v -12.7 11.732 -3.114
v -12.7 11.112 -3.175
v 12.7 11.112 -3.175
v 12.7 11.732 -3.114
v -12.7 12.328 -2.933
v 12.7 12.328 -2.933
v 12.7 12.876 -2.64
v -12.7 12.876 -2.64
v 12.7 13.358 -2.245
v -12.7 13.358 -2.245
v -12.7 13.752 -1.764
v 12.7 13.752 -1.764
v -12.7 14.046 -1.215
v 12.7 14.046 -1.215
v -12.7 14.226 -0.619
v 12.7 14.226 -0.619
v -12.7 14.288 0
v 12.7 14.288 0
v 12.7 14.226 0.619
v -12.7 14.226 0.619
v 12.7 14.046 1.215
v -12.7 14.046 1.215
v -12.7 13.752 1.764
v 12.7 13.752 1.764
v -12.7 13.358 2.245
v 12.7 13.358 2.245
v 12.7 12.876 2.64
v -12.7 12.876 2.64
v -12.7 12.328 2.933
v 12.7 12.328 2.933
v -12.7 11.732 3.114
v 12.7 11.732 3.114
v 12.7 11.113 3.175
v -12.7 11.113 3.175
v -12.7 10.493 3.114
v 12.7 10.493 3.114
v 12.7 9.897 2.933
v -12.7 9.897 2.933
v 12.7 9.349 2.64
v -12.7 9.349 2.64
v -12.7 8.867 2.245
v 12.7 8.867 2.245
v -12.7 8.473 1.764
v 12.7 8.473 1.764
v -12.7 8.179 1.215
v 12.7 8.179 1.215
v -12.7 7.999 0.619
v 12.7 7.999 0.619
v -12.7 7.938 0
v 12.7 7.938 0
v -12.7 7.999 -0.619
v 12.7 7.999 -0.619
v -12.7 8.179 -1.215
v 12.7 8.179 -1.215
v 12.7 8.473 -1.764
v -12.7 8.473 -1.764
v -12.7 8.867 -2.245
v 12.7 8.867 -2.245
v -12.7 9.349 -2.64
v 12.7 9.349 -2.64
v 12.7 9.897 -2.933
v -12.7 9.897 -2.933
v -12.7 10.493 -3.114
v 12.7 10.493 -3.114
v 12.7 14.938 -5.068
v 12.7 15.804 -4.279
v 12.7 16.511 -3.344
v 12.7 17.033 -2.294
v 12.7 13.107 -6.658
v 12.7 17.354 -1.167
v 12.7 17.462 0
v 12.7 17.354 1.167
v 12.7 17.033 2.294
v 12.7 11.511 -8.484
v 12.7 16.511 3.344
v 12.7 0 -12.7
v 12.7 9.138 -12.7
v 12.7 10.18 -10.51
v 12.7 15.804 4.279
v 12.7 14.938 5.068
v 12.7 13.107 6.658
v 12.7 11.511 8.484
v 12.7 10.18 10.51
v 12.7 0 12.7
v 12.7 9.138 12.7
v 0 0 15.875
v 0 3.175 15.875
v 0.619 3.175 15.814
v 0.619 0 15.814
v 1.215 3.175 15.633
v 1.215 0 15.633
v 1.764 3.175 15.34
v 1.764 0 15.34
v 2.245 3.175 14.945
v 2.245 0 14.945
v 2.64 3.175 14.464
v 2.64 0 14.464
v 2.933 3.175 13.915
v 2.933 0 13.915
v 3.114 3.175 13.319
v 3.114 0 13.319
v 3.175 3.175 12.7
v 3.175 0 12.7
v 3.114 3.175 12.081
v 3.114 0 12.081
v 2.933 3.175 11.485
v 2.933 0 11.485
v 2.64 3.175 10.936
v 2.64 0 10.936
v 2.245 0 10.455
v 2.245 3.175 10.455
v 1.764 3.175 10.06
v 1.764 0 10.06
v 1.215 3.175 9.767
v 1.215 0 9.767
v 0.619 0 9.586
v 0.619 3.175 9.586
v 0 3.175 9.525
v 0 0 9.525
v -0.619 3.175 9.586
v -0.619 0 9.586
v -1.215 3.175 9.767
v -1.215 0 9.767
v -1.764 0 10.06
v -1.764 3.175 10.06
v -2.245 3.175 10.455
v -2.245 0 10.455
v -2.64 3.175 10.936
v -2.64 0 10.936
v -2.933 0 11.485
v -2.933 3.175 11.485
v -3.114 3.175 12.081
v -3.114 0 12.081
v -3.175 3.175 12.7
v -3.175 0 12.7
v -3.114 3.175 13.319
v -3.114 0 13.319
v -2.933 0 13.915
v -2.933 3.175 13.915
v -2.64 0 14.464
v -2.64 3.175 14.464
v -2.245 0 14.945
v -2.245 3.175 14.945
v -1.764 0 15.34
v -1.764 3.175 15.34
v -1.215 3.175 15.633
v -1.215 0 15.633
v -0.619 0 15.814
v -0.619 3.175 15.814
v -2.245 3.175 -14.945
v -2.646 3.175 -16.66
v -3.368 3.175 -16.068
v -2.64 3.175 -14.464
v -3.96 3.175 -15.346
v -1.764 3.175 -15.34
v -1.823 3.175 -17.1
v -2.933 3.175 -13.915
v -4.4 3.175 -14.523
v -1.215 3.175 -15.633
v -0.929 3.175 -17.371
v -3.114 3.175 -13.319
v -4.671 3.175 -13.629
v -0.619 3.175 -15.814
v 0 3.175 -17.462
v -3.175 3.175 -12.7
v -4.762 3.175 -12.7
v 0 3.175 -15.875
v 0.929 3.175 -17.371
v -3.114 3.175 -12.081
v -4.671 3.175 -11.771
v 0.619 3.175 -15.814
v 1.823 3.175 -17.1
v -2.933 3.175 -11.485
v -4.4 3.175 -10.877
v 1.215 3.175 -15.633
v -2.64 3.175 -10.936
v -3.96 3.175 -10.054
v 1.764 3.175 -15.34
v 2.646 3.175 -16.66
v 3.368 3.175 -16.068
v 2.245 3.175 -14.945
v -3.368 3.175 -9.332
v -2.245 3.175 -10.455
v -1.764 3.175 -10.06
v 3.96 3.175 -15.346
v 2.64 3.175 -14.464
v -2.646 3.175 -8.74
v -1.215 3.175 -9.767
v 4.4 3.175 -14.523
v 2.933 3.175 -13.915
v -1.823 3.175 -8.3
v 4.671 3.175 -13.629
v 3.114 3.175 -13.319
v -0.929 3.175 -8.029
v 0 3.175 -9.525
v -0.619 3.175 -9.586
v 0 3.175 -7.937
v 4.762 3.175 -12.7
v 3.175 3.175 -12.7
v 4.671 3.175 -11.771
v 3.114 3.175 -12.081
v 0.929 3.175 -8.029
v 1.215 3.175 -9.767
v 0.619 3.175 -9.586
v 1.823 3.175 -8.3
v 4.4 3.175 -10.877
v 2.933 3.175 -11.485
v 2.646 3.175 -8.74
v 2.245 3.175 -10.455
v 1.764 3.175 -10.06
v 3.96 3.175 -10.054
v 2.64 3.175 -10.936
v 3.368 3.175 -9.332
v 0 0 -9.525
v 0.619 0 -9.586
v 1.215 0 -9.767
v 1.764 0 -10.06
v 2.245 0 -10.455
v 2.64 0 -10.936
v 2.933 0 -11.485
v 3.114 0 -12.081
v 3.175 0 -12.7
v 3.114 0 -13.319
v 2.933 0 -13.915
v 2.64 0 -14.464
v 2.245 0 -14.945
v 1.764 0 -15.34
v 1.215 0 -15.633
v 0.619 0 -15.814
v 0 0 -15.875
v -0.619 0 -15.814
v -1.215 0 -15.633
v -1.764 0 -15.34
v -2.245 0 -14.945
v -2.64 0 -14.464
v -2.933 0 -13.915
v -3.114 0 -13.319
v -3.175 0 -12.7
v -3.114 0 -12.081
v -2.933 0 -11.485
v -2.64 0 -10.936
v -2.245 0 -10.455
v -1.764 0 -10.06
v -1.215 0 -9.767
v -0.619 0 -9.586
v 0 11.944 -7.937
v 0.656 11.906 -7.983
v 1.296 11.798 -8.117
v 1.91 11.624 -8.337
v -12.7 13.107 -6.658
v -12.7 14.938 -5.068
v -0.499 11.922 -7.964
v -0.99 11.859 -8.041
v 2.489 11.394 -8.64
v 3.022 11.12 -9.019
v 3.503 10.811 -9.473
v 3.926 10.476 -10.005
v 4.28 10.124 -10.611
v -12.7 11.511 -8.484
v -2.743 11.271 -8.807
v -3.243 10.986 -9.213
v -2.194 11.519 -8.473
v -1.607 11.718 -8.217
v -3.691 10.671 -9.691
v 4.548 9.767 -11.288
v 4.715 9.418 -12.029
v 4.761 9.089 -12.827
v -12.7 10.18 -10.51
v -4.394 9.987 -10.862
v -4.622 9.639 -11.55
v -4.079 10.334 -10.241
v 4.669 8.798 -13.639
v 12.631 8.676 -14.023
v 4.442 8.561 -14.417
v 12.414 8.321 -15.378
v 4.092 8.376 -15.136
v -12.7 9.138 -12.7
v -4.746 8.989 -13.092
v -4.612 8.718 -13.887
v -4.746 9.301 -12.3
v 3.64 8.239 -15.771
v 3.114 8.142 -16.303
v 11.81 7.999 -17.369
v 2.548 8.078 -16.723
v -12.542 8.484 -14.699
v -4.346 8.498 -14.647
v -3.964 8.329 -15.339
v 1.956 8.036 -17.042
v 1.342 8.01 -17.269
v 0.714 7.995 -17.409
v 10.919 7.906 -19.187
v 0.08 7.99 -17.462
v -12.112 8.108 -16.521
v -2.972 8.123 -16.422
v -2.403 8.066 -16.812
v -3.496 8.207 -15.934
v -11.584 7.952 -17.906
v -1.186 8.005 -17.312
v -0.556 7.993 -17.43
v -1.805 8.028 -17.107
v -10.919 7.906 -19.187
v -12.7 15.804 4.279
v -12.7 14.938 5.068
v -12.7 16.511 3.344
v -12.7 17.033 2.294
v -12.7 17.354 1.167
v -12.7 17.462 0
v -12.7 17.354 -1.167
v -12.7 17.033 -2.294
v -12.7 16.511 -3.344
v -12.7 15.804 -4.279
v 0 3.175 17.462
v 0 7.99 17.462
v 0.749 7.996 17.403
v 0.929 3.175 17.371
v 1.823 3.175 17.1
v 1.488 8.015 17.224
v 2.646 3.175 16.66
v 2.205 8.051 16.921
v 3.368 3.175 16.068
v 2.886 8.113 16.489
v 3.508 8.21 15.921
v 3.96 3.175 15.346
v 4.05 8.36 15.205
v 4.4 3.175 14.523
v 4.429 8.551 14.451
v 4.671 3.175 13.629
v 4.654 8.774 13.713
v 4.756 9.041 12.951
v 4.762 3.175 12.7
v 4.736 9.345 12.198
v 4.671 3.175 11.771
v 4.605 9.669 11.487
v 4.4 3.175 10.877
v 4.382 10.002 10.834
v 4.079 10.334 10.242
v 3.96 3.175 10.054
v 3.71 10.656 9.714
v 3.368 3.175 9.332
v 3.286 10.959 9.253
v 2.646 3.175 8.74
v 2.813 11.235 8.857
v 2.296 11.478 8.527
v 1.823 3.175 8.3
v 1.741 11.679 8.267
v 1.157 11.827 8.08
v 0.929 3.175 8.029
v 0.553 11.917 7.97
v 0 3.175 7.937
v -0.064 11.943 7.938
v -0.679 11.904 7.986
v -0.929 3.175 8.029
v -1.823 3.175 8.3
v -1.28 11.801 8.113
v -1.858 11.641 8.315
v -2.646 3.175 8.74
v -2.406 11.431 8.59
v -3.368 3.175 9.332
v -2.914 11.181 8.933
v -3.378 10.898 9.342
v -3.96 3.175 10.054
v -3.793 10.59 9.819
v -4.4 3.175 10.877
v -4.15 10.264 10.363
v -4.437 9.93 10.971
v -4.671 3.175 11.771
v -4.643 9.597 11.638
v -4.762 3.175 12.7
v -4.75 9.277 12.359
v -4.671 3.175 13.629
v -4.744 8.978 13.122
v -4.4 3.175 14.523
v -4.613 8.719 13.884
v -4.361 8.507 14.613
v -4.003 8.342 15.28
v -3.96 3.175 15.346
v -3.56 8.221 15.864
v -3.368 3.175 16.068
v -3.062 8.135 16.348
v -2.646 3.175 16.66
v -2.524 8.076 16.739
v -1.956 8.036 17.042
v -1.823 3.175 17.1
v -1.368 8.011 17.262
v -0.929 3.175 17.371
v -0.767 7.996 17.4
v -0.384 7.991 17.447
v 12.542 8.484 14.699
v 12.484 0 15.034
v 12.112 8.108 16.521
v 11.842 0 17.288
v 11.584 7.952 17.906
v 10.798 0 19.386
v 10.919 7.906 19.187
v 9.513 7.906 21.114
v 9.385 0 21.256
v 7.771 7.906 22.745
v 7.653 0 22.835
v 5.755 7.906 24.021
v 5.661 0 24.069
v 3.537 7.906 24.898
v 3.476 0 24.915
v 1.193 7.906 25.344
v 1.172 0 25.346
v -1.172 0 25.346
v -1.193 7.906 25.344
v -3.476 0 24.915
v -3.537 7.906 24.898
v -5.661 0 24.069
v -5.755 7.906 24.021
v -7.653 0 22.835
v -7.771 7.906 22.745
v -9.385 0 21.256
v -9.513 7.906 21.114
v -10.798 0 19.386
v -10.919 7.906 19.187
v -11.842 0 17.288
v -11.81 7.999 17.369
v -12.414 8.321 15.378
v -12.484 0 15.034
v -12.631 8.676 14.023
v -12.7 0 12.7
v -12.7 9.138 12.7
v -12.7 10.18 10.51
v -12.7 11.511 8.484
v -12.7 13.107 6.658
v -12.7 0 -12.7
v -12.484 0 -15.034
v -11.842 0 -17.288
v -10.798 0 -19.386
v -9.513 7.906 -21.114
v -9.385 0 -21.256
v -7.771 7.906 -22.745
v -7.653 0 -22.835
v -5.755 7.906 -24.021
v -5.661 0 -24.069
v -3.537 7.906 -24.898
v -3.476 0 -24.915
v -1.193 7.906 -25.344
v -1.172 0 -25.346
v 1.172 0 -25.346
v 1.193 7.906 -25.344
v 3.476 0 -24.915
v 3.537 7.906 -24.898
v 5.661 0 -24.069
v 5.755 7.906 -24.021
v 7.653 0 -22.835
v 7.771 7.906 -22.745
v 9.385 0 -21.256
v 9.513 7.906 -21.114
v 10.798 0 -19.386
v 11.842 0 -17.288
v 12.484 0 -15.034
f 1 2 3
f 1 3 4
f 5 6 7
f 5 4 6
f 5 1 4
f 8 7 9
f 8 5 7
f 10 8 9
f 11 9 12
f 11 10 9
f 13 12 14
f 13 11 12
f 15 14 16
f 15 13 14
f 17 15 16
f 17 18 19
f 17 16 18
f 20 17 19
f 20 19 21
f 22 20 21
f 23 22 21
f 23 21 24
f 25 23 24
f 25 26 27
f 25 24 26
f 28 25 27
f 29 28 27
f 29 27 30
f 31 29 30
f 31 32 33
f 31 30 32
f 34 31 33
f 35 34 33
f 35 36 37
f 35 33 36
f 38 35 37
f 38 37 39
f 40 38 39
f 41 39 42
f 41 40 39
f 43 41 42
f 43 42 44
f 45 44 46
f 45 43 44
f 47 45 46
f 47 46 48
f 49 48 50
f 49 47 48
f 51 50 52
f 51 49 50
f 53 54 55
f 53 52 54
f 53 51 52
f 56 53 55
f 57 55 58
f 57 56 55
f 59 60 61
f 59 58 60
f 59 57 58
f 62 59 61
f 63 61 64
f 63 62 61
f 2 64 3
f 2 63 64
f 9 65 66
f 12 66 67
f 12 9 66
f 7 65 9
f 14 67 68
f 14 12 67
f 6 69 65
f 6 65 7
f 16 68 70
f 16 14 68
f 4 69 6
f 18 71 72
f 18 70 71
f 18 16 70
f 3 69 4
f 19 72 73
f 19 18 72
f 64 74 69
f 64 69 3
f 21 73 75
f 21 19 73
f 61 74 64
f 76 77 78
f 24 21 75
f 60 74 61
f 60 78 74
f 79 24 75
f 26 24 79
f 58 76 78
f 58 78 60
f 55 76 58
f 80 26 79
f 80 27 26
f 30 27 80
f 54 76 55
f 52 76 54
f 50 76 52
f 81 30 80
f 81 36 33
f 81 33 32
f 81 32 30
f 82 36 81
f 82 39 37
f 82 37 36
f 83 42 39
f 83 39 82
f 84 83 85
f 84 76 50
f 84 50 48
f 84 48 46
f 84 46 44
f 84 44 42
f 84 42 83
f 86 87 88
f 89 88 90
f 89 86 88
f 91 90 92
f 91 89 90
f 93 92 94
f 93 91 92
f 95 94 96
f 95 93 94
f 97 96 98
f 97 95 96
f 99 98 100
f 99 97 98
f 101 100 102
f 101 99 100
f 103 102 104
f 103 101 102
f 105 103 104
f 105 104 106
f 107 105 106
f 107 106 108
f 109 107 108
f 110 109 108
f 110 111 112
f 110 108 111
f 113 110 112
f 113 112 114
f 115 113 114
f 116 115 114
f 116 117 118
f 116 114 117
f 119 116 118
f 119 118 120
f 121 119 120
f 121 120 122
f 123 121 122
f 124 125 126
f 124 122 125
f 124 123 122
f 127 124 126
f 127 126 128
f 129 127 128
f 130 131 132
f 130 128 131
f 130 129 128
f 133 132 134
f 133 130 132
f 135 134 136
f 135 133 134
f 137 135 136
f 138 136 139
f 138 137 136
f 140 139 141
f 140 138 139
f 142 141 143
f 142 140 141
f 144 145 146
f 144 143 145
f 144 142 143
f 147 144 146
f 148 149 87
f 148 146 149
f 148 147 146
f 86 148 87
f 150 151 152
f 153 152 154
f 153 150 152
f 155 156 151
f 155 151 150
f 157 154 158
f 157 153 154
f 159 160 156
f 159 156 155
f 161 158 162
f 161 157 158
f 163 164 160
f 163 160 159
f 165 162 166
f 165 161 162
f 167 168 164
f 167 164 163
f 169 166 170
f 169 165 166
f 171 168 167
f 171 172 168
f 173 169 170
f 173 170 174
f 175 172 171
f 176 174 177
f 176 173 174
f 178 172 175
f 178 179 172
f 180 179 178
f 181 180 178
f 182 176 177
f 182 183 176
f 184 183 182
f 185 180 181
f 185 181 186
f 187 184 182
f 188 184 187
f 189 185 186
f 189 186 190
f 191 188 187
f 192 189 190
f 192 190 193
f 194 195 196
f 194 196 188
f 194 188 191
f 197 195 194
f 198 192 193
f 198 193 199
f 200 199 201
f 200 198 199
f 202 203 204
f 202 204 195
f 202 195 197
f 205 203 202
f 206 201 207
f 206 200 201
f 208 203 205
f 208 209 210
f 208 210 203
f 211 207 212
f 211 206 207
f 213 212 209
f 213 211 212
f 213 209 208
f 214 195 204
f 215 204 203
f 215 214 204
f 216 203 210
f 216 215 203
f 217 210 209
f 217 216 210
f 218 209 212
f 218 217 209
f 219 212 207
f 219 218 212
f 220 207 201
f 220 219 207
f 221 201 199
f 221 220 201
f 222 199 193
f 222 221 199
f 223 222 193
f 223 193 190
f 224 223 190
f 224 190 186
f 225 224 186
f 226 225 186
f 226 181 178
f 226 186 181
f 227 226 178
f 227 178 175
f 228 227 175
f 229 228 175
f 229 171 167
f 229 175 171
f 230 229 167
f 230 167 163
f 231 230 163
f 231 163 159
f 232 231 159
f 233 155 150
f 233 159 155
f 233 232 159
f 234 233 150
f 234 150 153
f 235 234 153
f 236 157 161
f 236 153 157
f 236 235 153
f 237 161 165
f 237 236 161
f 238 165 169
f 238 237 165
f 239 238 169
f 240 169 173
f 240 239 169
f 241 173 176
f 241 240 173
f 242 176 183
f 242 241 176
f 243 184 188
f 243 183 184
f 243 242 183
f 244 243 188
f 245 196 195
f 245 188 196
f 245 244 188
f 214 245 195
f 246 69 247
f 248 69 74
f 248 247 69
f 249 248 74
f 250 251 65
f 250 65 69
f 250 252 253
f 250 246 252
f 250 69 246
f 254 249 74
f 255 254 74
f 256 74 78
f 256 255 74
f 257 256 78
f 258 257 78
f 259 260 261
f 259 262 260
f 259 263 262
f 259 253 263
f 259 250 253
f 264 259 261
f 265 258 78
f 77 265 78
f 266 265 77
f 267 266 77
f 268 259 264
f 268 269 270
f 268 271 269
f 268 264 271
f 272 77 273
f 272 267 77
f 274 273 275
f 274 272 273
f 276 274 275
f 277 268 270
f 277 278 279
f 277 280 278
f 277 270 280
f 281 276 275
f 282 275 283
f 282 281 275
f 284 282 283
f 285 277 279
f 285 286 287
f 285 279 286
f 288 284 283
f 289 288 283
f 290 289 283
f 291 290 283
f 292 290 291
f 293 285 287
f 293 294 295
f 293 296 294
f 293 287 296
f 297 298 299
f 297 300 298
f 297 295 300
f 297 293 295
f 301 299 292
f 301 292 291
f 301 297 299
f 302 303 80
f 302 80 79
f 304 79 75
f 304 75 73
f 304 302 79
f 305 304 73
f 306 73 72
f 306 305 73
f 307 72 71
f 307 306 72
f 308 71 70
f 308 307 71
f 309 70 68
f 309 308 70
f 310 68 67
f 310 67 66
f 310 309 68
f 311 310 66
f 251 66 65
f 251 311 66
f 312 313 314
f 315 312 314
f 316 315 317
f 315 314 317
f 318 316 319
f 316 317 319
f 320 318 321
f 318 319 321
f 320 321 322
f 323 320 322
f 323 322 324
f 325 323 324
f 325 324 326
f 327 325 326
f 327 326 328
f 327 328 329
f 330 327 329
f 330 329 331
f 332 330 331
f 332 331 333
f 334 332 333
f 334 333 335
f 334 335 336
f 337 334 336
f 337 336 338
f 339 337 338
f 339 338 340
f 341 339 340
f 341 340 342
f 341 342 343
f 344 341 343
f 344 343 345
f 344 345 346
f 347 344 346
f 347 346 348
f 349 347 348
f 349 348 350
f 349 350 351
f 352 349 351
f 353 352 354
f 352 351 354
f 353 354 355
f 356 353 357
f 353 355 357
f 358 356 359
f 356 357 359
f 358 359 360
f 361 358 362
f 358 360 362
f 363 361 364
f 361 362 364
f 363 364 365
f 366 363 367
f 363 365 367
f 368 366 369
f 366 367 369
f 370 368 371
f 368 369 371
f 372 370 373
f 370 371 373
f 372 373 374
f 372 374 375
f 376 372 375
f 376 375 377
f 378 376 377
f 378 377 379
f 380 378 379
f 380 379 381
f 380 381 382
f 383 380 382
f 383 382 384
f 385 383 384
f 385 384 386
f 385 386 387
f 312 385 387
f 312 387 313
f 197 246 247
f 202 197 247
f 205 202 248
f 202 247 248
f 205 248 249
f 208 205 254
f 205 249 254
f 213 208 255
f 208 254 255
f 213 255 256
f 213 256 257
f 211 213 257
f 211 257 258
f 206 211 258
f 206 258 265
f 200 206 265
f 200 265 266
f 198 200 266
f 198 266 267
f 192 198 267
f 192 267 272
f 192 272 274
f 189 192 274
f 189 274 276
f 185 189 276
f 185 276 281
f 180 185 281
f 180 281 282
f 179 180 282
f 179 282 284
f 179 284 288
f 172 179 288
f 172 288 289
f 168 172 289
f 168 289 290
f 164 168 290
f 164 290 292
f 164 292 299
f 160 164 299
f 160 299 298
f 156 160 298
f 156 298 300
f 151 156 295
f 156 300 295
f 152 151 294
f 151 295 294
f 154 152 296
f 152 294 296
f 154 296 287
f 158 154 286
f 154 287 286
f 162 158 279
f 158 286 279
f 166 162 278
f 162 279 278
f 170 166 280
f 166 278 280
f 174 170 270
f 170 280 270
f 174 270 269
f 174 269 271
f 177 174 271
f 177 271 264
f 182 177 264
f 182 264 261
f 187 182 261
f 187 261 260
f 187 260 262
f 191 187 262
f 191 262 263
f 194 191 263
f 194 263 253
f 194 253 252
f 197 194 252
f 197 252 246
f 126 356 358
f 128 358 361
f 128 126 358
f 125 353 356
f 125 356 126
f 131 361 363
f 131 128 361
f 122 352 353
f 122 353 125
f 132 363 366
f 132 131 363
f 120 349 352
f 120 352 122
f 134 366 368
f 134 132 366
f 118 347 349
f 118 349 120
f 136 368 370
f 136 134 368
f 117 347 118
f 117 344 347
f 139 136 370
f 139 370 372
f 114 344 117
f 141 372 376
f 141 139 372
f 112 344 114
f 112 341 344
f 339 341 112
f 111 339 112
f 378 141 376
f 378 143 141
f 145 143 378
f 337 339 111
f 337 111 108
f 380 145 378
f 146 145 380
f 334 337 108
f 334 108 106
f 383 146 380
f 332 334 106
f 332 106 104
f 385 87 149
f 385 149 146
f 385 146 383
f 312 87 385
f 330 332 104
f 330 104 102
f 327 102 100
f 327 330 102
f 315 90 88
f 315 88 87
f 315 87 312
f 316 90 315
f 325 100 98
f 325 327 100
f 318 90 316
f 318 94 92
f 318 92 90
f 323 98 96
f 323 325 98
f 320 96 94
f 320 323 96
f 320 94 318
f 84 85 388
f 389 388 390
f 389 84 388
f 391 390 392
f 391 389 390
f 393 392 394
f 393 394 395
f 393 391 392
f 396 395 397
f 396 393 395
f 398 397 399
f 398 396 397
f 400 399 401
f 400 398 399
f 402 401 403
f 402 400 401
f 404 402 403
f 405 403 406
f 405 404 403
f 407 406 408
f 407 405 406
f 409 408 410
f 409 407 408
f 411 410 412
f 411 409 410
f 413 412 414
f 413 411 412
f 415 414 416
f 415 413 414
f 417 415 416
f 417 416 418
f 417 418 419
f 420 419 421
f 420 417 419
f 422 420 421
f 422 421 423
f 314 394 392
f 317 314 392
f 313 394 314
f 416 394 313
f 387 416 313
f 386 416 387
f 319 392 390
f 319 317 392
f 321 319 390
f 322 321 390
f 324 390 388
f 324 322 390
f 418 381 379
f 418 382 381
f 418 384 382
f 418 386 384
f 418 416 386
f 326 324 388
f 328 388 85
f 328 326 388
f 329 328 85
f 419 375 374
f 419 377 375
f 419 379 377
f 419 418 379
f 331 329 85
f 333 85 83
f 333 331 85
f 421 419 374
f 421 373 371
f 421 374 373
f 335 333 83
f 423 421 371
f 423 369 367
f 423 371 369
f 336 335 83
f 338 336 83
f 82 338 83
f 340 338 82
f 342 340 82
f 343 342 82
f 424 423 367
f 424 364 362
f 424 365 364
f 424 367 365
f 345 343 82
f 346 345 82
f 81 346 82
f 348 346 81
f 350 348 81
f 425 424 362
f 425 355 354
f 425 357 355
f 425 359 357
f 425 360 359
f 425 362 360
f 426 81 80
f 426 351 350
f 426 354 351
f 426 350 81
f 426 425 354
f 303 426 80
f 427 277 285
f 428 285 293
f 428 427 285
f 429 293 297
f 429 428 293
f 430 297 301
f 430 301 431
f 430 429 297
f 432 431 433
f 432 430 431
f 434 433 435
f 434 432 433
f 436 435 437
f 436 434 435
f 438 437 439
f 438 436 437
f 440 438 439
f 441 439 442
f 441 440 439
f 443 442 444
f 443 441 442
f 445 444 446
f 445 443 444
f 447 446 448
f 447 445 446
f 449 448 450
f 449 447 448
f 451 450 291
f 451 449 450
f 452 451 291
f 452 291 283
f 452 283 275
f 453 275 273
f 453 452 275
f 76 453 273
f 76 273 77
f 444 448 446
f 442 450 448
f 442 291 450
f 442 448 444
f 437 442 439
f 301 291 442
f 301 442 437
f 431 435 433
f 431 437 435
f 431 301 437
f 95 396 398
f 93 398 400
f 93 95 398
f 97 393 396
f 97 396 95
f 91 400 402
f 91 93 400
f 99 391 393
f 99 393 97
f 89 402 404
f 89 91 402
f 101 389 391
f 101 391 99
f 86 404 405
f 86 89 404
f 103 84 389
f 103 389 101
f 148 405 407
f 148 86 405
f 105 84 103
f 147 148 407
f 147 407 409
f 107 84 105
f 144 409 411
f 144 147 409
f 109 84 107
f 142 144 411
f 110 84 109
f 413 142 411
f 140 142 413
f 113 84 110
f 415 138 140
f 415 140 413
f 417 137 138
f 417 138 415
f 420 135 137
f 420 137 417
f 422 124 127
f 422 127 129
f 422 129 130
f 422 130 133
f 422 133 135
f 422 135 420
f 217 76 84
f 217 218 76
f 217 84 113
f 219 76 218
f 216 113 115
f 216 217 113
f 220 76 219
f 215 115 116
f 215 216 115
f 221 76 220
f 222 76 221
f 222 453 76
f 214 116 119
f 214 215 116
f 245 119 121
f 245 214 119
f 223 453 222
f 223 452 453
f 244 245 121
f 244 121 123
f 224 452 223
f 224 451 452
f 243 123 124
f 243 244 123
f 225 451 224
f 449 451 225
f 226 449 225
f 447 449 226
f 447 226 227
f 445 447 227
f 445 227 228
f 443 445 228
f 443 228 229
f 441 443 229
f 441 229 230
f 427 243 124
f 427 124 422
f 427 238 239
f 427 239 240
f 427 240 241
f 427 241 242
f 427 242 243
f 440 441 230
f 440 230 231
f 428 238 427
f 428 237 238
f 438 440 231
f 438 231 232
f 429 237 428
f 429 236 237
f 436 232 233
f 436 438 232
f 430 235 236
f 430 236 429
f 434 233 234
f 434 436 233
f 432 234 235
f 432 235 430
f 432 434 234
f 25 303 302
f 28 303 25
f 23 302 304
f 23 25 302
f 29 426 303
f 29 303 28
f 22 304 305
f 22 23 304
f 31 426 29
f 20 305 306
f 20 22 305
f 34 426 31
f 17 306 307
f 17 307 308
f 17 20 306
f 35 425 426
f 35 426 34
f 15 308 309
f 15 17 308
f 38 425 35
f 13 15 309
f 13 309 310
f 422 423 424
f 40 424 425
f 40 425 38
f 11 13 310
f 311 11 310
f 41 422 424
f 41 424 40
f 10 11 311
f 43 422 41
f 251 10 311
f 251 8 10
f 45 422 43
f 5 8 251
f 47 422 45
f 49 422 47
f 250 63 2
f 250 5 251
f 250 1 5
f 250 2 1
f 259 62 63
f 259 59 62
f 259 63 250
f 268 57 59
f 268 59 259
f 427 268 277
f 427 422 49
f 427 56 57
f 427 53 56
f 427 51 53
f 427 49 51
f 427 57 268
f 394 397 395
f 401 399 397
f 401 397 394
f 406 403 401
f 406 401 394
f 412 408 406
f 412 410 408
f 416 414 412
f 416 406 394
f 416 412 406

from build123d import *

# Parameters (mm, degrees)
SKETCH2_R               = 3.175
BOSS_EXTRUDE1_DEPTH     = 25.4
CUT_EXTRUDE1_DEPTH      = 39.1
CUT_EXTRUDE1_DEPTH_BACK = 39.1
SKETCH3_R               = 3.175
SKETCH4_R               = 4.7625
CUT_EXTRUDE2_DEPTH      = 22.225


with BuildPart() as part:
    # Sketch2 → Boss-Extrude1 (new body)
    with BuildSketch(Plane(origin=(0, 0, 0), x_dir=(1, 0, 0), z_dir=(0, 1, 0))):
        with BuildLine():
            Line((12.7, 12.7), (12.7, -12.7))
            ThreePointArc((12.7, -12.7), (0, -25.4), (-12.7, -12.7))
            Line((-12.7, -12.7), (-12.7, 12.7))
            ThreePointArc((-12.7, 12.7), (0, 25.4), (12.7, 12.7))
        make_face()
        with Locations(Location((0, 12.7, 0), (0, 0, 270))):
            Circle(SKETCH2_R, mode=Mode.SUBTRACT)
        with Locations(Location((0, -12.7, 0), (0, 0, 270))):
            Circle(SKETCH2_R, mode=Mode.SUBTRACT)
    extrude(amount=BOSS_EXTRUDE1_DEPTH)

    # Sketch3 → Cut-Extrude1 (cut, two sides: drawn at the far end of the back side and taken through both)
    with BuildSketch(Plane(origin=(0, 0, 0), x_dir=(0, 0, -1), z_dir=(1, 0, 0)).offset(-CUT_EXTRUDE1_DEPTH_BACK)):
        with Locations((0, 11.1125)):
            Circle(SKETCH3_R)
        with BuildLine():
            Line((-25.4, 7.90575), (-19.186582283, 7.90575))
            ThreePointArc((-19.186582283, 7.90575), (-11.300258027, 9.761112271), (-5.068357629, 14.937973951))
            ThreePointArc((-5.068357629, 14.937973951), (0, 17.4625), (5.068357629, 14.937973951))
            ThreePointArc((5.068357629, 14.937973951), (11.300258027, 9.761112271), (19.186582283, 7.90575))
            Line((19.186582283, 7.90575), (25.4, 7.90575))
            Line((25.4, 7.90575), (25.4, 30.015599029))
            Line((25.4, 30.015599029), (-31.207208801, 35.201112742))
            Line((-31.207208801, 35.201112742), (-25.4, 7.90575))
        make_face()
    extrude(amount=CUT_EXTRUDE1_DEPTH + CUT_EXTRUDE1_DEPTH_BACK, mode=Mode.SUBTRACT)

    # Sketch4 → Cut-Extrude2 (cut)
    with BuildSketch(Plane(origin=(0, 25.4, 0), x_dir=(1, 0, 0), z_dir=(0, 1, 0))):
        with Locations(Location((0, -12.7, 0), (0, 0, 270))):
            Circle(SKETCH4_R)
        with Locations(Location((0, 12.7, 0), (0, 0, 270))):
            Circle(SKETCH4_R)
    extrude(amount=-CUT_EXTRUDE2_DEPTH, mode=Mode.SUBTRACT)


solid = part.part
